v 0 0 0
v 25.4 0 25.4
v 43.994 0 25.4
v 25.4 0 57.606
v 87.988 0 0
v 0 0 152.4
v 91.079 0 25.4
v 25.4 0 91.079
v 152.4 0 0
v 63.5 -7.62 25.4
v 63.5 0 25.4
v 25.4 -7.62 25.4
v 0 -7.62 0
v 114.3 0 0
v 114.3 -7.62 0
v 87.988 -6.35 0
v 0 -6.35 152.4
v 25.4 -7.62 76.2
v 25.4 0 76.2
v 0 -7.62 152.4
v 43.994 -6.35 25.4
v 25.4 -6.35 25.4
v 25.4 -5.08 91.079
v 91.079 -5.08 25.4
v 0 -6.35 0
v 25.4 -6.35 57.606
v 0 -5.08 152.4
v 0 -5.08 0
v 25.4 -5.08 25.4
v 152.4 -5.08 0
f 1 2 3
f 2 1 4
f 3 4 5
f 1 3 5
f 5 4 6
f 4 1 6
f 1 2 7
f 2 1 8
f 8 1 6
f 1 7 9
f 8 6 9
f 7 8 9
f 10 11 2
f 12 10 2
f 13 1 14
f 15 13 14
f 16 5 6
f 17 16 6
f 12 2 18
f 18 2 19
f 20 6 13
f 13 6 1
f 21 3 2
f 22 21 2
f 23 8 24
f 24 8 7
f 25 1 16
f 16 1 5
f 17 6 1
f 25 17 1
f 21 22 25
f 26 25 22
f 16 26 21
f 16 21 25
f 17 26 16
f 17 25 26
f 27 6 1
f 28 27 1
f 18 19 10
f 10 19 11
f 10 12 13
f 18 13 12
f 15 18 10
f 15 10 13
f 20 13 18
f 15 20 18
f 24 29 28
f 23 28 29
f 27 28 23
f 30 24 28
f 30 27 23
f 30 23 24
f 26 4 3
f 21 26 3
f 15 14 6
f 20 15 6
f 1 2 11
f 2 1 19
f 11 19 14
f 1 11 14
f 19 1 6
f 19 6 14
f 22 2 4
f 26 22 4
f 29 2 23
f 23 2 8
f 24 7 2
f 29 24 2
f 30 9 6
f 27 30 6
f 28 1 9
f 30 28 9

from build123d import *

# Parameters (mm, degrees)
F1_DEPTH = 5.08
F3_DEPTH = 6.35
F5_DEPTH = 7.62


with BuildPart() as f1:
    # F0 (on Front) → F1 (new body)
    with BuildSketch(Plane.XZ):
        Polygon((0, 152.4), (0, 0), (152.4, 0), align=None)
        Polygon((91.078976, 25.4), (25.4, 25.4), (25.4, 91.078976), align=None, mode=Mode.SUBTRACT)
    extrude(amount=F1_DEPTH)


with BuildPart() as f3:
    # F2 (on Front) → F3 (new body)
    with BuildSketch(Plane.XZ):
        Polygon((0, 152.4), (0, 0), (87.988181, 0), align=None)
        Polygon((43.994091, 25.4), (25.4, 25.4), (25.4, 57.605909), align=None, mode=Mode.SUBTRACT)
    extrude(amount=F3_DEPTH)


with BuildPart() as f5:
    # F4 (on Front) → F5 (new body)
    with BuildSketch(Plane.XZ):
        Polygon((0, 152.4), (0, 0), (114.3, 0), align=None)
        Polygon((63.5, 25.4), (25.4, 25.4), (25.4, 76.2), align=None, mode=Mode.SUBTRACT)
    extrude(amount=F5_DEPTH)


solid = Compound([f1.part, f3.part, f5.part])
